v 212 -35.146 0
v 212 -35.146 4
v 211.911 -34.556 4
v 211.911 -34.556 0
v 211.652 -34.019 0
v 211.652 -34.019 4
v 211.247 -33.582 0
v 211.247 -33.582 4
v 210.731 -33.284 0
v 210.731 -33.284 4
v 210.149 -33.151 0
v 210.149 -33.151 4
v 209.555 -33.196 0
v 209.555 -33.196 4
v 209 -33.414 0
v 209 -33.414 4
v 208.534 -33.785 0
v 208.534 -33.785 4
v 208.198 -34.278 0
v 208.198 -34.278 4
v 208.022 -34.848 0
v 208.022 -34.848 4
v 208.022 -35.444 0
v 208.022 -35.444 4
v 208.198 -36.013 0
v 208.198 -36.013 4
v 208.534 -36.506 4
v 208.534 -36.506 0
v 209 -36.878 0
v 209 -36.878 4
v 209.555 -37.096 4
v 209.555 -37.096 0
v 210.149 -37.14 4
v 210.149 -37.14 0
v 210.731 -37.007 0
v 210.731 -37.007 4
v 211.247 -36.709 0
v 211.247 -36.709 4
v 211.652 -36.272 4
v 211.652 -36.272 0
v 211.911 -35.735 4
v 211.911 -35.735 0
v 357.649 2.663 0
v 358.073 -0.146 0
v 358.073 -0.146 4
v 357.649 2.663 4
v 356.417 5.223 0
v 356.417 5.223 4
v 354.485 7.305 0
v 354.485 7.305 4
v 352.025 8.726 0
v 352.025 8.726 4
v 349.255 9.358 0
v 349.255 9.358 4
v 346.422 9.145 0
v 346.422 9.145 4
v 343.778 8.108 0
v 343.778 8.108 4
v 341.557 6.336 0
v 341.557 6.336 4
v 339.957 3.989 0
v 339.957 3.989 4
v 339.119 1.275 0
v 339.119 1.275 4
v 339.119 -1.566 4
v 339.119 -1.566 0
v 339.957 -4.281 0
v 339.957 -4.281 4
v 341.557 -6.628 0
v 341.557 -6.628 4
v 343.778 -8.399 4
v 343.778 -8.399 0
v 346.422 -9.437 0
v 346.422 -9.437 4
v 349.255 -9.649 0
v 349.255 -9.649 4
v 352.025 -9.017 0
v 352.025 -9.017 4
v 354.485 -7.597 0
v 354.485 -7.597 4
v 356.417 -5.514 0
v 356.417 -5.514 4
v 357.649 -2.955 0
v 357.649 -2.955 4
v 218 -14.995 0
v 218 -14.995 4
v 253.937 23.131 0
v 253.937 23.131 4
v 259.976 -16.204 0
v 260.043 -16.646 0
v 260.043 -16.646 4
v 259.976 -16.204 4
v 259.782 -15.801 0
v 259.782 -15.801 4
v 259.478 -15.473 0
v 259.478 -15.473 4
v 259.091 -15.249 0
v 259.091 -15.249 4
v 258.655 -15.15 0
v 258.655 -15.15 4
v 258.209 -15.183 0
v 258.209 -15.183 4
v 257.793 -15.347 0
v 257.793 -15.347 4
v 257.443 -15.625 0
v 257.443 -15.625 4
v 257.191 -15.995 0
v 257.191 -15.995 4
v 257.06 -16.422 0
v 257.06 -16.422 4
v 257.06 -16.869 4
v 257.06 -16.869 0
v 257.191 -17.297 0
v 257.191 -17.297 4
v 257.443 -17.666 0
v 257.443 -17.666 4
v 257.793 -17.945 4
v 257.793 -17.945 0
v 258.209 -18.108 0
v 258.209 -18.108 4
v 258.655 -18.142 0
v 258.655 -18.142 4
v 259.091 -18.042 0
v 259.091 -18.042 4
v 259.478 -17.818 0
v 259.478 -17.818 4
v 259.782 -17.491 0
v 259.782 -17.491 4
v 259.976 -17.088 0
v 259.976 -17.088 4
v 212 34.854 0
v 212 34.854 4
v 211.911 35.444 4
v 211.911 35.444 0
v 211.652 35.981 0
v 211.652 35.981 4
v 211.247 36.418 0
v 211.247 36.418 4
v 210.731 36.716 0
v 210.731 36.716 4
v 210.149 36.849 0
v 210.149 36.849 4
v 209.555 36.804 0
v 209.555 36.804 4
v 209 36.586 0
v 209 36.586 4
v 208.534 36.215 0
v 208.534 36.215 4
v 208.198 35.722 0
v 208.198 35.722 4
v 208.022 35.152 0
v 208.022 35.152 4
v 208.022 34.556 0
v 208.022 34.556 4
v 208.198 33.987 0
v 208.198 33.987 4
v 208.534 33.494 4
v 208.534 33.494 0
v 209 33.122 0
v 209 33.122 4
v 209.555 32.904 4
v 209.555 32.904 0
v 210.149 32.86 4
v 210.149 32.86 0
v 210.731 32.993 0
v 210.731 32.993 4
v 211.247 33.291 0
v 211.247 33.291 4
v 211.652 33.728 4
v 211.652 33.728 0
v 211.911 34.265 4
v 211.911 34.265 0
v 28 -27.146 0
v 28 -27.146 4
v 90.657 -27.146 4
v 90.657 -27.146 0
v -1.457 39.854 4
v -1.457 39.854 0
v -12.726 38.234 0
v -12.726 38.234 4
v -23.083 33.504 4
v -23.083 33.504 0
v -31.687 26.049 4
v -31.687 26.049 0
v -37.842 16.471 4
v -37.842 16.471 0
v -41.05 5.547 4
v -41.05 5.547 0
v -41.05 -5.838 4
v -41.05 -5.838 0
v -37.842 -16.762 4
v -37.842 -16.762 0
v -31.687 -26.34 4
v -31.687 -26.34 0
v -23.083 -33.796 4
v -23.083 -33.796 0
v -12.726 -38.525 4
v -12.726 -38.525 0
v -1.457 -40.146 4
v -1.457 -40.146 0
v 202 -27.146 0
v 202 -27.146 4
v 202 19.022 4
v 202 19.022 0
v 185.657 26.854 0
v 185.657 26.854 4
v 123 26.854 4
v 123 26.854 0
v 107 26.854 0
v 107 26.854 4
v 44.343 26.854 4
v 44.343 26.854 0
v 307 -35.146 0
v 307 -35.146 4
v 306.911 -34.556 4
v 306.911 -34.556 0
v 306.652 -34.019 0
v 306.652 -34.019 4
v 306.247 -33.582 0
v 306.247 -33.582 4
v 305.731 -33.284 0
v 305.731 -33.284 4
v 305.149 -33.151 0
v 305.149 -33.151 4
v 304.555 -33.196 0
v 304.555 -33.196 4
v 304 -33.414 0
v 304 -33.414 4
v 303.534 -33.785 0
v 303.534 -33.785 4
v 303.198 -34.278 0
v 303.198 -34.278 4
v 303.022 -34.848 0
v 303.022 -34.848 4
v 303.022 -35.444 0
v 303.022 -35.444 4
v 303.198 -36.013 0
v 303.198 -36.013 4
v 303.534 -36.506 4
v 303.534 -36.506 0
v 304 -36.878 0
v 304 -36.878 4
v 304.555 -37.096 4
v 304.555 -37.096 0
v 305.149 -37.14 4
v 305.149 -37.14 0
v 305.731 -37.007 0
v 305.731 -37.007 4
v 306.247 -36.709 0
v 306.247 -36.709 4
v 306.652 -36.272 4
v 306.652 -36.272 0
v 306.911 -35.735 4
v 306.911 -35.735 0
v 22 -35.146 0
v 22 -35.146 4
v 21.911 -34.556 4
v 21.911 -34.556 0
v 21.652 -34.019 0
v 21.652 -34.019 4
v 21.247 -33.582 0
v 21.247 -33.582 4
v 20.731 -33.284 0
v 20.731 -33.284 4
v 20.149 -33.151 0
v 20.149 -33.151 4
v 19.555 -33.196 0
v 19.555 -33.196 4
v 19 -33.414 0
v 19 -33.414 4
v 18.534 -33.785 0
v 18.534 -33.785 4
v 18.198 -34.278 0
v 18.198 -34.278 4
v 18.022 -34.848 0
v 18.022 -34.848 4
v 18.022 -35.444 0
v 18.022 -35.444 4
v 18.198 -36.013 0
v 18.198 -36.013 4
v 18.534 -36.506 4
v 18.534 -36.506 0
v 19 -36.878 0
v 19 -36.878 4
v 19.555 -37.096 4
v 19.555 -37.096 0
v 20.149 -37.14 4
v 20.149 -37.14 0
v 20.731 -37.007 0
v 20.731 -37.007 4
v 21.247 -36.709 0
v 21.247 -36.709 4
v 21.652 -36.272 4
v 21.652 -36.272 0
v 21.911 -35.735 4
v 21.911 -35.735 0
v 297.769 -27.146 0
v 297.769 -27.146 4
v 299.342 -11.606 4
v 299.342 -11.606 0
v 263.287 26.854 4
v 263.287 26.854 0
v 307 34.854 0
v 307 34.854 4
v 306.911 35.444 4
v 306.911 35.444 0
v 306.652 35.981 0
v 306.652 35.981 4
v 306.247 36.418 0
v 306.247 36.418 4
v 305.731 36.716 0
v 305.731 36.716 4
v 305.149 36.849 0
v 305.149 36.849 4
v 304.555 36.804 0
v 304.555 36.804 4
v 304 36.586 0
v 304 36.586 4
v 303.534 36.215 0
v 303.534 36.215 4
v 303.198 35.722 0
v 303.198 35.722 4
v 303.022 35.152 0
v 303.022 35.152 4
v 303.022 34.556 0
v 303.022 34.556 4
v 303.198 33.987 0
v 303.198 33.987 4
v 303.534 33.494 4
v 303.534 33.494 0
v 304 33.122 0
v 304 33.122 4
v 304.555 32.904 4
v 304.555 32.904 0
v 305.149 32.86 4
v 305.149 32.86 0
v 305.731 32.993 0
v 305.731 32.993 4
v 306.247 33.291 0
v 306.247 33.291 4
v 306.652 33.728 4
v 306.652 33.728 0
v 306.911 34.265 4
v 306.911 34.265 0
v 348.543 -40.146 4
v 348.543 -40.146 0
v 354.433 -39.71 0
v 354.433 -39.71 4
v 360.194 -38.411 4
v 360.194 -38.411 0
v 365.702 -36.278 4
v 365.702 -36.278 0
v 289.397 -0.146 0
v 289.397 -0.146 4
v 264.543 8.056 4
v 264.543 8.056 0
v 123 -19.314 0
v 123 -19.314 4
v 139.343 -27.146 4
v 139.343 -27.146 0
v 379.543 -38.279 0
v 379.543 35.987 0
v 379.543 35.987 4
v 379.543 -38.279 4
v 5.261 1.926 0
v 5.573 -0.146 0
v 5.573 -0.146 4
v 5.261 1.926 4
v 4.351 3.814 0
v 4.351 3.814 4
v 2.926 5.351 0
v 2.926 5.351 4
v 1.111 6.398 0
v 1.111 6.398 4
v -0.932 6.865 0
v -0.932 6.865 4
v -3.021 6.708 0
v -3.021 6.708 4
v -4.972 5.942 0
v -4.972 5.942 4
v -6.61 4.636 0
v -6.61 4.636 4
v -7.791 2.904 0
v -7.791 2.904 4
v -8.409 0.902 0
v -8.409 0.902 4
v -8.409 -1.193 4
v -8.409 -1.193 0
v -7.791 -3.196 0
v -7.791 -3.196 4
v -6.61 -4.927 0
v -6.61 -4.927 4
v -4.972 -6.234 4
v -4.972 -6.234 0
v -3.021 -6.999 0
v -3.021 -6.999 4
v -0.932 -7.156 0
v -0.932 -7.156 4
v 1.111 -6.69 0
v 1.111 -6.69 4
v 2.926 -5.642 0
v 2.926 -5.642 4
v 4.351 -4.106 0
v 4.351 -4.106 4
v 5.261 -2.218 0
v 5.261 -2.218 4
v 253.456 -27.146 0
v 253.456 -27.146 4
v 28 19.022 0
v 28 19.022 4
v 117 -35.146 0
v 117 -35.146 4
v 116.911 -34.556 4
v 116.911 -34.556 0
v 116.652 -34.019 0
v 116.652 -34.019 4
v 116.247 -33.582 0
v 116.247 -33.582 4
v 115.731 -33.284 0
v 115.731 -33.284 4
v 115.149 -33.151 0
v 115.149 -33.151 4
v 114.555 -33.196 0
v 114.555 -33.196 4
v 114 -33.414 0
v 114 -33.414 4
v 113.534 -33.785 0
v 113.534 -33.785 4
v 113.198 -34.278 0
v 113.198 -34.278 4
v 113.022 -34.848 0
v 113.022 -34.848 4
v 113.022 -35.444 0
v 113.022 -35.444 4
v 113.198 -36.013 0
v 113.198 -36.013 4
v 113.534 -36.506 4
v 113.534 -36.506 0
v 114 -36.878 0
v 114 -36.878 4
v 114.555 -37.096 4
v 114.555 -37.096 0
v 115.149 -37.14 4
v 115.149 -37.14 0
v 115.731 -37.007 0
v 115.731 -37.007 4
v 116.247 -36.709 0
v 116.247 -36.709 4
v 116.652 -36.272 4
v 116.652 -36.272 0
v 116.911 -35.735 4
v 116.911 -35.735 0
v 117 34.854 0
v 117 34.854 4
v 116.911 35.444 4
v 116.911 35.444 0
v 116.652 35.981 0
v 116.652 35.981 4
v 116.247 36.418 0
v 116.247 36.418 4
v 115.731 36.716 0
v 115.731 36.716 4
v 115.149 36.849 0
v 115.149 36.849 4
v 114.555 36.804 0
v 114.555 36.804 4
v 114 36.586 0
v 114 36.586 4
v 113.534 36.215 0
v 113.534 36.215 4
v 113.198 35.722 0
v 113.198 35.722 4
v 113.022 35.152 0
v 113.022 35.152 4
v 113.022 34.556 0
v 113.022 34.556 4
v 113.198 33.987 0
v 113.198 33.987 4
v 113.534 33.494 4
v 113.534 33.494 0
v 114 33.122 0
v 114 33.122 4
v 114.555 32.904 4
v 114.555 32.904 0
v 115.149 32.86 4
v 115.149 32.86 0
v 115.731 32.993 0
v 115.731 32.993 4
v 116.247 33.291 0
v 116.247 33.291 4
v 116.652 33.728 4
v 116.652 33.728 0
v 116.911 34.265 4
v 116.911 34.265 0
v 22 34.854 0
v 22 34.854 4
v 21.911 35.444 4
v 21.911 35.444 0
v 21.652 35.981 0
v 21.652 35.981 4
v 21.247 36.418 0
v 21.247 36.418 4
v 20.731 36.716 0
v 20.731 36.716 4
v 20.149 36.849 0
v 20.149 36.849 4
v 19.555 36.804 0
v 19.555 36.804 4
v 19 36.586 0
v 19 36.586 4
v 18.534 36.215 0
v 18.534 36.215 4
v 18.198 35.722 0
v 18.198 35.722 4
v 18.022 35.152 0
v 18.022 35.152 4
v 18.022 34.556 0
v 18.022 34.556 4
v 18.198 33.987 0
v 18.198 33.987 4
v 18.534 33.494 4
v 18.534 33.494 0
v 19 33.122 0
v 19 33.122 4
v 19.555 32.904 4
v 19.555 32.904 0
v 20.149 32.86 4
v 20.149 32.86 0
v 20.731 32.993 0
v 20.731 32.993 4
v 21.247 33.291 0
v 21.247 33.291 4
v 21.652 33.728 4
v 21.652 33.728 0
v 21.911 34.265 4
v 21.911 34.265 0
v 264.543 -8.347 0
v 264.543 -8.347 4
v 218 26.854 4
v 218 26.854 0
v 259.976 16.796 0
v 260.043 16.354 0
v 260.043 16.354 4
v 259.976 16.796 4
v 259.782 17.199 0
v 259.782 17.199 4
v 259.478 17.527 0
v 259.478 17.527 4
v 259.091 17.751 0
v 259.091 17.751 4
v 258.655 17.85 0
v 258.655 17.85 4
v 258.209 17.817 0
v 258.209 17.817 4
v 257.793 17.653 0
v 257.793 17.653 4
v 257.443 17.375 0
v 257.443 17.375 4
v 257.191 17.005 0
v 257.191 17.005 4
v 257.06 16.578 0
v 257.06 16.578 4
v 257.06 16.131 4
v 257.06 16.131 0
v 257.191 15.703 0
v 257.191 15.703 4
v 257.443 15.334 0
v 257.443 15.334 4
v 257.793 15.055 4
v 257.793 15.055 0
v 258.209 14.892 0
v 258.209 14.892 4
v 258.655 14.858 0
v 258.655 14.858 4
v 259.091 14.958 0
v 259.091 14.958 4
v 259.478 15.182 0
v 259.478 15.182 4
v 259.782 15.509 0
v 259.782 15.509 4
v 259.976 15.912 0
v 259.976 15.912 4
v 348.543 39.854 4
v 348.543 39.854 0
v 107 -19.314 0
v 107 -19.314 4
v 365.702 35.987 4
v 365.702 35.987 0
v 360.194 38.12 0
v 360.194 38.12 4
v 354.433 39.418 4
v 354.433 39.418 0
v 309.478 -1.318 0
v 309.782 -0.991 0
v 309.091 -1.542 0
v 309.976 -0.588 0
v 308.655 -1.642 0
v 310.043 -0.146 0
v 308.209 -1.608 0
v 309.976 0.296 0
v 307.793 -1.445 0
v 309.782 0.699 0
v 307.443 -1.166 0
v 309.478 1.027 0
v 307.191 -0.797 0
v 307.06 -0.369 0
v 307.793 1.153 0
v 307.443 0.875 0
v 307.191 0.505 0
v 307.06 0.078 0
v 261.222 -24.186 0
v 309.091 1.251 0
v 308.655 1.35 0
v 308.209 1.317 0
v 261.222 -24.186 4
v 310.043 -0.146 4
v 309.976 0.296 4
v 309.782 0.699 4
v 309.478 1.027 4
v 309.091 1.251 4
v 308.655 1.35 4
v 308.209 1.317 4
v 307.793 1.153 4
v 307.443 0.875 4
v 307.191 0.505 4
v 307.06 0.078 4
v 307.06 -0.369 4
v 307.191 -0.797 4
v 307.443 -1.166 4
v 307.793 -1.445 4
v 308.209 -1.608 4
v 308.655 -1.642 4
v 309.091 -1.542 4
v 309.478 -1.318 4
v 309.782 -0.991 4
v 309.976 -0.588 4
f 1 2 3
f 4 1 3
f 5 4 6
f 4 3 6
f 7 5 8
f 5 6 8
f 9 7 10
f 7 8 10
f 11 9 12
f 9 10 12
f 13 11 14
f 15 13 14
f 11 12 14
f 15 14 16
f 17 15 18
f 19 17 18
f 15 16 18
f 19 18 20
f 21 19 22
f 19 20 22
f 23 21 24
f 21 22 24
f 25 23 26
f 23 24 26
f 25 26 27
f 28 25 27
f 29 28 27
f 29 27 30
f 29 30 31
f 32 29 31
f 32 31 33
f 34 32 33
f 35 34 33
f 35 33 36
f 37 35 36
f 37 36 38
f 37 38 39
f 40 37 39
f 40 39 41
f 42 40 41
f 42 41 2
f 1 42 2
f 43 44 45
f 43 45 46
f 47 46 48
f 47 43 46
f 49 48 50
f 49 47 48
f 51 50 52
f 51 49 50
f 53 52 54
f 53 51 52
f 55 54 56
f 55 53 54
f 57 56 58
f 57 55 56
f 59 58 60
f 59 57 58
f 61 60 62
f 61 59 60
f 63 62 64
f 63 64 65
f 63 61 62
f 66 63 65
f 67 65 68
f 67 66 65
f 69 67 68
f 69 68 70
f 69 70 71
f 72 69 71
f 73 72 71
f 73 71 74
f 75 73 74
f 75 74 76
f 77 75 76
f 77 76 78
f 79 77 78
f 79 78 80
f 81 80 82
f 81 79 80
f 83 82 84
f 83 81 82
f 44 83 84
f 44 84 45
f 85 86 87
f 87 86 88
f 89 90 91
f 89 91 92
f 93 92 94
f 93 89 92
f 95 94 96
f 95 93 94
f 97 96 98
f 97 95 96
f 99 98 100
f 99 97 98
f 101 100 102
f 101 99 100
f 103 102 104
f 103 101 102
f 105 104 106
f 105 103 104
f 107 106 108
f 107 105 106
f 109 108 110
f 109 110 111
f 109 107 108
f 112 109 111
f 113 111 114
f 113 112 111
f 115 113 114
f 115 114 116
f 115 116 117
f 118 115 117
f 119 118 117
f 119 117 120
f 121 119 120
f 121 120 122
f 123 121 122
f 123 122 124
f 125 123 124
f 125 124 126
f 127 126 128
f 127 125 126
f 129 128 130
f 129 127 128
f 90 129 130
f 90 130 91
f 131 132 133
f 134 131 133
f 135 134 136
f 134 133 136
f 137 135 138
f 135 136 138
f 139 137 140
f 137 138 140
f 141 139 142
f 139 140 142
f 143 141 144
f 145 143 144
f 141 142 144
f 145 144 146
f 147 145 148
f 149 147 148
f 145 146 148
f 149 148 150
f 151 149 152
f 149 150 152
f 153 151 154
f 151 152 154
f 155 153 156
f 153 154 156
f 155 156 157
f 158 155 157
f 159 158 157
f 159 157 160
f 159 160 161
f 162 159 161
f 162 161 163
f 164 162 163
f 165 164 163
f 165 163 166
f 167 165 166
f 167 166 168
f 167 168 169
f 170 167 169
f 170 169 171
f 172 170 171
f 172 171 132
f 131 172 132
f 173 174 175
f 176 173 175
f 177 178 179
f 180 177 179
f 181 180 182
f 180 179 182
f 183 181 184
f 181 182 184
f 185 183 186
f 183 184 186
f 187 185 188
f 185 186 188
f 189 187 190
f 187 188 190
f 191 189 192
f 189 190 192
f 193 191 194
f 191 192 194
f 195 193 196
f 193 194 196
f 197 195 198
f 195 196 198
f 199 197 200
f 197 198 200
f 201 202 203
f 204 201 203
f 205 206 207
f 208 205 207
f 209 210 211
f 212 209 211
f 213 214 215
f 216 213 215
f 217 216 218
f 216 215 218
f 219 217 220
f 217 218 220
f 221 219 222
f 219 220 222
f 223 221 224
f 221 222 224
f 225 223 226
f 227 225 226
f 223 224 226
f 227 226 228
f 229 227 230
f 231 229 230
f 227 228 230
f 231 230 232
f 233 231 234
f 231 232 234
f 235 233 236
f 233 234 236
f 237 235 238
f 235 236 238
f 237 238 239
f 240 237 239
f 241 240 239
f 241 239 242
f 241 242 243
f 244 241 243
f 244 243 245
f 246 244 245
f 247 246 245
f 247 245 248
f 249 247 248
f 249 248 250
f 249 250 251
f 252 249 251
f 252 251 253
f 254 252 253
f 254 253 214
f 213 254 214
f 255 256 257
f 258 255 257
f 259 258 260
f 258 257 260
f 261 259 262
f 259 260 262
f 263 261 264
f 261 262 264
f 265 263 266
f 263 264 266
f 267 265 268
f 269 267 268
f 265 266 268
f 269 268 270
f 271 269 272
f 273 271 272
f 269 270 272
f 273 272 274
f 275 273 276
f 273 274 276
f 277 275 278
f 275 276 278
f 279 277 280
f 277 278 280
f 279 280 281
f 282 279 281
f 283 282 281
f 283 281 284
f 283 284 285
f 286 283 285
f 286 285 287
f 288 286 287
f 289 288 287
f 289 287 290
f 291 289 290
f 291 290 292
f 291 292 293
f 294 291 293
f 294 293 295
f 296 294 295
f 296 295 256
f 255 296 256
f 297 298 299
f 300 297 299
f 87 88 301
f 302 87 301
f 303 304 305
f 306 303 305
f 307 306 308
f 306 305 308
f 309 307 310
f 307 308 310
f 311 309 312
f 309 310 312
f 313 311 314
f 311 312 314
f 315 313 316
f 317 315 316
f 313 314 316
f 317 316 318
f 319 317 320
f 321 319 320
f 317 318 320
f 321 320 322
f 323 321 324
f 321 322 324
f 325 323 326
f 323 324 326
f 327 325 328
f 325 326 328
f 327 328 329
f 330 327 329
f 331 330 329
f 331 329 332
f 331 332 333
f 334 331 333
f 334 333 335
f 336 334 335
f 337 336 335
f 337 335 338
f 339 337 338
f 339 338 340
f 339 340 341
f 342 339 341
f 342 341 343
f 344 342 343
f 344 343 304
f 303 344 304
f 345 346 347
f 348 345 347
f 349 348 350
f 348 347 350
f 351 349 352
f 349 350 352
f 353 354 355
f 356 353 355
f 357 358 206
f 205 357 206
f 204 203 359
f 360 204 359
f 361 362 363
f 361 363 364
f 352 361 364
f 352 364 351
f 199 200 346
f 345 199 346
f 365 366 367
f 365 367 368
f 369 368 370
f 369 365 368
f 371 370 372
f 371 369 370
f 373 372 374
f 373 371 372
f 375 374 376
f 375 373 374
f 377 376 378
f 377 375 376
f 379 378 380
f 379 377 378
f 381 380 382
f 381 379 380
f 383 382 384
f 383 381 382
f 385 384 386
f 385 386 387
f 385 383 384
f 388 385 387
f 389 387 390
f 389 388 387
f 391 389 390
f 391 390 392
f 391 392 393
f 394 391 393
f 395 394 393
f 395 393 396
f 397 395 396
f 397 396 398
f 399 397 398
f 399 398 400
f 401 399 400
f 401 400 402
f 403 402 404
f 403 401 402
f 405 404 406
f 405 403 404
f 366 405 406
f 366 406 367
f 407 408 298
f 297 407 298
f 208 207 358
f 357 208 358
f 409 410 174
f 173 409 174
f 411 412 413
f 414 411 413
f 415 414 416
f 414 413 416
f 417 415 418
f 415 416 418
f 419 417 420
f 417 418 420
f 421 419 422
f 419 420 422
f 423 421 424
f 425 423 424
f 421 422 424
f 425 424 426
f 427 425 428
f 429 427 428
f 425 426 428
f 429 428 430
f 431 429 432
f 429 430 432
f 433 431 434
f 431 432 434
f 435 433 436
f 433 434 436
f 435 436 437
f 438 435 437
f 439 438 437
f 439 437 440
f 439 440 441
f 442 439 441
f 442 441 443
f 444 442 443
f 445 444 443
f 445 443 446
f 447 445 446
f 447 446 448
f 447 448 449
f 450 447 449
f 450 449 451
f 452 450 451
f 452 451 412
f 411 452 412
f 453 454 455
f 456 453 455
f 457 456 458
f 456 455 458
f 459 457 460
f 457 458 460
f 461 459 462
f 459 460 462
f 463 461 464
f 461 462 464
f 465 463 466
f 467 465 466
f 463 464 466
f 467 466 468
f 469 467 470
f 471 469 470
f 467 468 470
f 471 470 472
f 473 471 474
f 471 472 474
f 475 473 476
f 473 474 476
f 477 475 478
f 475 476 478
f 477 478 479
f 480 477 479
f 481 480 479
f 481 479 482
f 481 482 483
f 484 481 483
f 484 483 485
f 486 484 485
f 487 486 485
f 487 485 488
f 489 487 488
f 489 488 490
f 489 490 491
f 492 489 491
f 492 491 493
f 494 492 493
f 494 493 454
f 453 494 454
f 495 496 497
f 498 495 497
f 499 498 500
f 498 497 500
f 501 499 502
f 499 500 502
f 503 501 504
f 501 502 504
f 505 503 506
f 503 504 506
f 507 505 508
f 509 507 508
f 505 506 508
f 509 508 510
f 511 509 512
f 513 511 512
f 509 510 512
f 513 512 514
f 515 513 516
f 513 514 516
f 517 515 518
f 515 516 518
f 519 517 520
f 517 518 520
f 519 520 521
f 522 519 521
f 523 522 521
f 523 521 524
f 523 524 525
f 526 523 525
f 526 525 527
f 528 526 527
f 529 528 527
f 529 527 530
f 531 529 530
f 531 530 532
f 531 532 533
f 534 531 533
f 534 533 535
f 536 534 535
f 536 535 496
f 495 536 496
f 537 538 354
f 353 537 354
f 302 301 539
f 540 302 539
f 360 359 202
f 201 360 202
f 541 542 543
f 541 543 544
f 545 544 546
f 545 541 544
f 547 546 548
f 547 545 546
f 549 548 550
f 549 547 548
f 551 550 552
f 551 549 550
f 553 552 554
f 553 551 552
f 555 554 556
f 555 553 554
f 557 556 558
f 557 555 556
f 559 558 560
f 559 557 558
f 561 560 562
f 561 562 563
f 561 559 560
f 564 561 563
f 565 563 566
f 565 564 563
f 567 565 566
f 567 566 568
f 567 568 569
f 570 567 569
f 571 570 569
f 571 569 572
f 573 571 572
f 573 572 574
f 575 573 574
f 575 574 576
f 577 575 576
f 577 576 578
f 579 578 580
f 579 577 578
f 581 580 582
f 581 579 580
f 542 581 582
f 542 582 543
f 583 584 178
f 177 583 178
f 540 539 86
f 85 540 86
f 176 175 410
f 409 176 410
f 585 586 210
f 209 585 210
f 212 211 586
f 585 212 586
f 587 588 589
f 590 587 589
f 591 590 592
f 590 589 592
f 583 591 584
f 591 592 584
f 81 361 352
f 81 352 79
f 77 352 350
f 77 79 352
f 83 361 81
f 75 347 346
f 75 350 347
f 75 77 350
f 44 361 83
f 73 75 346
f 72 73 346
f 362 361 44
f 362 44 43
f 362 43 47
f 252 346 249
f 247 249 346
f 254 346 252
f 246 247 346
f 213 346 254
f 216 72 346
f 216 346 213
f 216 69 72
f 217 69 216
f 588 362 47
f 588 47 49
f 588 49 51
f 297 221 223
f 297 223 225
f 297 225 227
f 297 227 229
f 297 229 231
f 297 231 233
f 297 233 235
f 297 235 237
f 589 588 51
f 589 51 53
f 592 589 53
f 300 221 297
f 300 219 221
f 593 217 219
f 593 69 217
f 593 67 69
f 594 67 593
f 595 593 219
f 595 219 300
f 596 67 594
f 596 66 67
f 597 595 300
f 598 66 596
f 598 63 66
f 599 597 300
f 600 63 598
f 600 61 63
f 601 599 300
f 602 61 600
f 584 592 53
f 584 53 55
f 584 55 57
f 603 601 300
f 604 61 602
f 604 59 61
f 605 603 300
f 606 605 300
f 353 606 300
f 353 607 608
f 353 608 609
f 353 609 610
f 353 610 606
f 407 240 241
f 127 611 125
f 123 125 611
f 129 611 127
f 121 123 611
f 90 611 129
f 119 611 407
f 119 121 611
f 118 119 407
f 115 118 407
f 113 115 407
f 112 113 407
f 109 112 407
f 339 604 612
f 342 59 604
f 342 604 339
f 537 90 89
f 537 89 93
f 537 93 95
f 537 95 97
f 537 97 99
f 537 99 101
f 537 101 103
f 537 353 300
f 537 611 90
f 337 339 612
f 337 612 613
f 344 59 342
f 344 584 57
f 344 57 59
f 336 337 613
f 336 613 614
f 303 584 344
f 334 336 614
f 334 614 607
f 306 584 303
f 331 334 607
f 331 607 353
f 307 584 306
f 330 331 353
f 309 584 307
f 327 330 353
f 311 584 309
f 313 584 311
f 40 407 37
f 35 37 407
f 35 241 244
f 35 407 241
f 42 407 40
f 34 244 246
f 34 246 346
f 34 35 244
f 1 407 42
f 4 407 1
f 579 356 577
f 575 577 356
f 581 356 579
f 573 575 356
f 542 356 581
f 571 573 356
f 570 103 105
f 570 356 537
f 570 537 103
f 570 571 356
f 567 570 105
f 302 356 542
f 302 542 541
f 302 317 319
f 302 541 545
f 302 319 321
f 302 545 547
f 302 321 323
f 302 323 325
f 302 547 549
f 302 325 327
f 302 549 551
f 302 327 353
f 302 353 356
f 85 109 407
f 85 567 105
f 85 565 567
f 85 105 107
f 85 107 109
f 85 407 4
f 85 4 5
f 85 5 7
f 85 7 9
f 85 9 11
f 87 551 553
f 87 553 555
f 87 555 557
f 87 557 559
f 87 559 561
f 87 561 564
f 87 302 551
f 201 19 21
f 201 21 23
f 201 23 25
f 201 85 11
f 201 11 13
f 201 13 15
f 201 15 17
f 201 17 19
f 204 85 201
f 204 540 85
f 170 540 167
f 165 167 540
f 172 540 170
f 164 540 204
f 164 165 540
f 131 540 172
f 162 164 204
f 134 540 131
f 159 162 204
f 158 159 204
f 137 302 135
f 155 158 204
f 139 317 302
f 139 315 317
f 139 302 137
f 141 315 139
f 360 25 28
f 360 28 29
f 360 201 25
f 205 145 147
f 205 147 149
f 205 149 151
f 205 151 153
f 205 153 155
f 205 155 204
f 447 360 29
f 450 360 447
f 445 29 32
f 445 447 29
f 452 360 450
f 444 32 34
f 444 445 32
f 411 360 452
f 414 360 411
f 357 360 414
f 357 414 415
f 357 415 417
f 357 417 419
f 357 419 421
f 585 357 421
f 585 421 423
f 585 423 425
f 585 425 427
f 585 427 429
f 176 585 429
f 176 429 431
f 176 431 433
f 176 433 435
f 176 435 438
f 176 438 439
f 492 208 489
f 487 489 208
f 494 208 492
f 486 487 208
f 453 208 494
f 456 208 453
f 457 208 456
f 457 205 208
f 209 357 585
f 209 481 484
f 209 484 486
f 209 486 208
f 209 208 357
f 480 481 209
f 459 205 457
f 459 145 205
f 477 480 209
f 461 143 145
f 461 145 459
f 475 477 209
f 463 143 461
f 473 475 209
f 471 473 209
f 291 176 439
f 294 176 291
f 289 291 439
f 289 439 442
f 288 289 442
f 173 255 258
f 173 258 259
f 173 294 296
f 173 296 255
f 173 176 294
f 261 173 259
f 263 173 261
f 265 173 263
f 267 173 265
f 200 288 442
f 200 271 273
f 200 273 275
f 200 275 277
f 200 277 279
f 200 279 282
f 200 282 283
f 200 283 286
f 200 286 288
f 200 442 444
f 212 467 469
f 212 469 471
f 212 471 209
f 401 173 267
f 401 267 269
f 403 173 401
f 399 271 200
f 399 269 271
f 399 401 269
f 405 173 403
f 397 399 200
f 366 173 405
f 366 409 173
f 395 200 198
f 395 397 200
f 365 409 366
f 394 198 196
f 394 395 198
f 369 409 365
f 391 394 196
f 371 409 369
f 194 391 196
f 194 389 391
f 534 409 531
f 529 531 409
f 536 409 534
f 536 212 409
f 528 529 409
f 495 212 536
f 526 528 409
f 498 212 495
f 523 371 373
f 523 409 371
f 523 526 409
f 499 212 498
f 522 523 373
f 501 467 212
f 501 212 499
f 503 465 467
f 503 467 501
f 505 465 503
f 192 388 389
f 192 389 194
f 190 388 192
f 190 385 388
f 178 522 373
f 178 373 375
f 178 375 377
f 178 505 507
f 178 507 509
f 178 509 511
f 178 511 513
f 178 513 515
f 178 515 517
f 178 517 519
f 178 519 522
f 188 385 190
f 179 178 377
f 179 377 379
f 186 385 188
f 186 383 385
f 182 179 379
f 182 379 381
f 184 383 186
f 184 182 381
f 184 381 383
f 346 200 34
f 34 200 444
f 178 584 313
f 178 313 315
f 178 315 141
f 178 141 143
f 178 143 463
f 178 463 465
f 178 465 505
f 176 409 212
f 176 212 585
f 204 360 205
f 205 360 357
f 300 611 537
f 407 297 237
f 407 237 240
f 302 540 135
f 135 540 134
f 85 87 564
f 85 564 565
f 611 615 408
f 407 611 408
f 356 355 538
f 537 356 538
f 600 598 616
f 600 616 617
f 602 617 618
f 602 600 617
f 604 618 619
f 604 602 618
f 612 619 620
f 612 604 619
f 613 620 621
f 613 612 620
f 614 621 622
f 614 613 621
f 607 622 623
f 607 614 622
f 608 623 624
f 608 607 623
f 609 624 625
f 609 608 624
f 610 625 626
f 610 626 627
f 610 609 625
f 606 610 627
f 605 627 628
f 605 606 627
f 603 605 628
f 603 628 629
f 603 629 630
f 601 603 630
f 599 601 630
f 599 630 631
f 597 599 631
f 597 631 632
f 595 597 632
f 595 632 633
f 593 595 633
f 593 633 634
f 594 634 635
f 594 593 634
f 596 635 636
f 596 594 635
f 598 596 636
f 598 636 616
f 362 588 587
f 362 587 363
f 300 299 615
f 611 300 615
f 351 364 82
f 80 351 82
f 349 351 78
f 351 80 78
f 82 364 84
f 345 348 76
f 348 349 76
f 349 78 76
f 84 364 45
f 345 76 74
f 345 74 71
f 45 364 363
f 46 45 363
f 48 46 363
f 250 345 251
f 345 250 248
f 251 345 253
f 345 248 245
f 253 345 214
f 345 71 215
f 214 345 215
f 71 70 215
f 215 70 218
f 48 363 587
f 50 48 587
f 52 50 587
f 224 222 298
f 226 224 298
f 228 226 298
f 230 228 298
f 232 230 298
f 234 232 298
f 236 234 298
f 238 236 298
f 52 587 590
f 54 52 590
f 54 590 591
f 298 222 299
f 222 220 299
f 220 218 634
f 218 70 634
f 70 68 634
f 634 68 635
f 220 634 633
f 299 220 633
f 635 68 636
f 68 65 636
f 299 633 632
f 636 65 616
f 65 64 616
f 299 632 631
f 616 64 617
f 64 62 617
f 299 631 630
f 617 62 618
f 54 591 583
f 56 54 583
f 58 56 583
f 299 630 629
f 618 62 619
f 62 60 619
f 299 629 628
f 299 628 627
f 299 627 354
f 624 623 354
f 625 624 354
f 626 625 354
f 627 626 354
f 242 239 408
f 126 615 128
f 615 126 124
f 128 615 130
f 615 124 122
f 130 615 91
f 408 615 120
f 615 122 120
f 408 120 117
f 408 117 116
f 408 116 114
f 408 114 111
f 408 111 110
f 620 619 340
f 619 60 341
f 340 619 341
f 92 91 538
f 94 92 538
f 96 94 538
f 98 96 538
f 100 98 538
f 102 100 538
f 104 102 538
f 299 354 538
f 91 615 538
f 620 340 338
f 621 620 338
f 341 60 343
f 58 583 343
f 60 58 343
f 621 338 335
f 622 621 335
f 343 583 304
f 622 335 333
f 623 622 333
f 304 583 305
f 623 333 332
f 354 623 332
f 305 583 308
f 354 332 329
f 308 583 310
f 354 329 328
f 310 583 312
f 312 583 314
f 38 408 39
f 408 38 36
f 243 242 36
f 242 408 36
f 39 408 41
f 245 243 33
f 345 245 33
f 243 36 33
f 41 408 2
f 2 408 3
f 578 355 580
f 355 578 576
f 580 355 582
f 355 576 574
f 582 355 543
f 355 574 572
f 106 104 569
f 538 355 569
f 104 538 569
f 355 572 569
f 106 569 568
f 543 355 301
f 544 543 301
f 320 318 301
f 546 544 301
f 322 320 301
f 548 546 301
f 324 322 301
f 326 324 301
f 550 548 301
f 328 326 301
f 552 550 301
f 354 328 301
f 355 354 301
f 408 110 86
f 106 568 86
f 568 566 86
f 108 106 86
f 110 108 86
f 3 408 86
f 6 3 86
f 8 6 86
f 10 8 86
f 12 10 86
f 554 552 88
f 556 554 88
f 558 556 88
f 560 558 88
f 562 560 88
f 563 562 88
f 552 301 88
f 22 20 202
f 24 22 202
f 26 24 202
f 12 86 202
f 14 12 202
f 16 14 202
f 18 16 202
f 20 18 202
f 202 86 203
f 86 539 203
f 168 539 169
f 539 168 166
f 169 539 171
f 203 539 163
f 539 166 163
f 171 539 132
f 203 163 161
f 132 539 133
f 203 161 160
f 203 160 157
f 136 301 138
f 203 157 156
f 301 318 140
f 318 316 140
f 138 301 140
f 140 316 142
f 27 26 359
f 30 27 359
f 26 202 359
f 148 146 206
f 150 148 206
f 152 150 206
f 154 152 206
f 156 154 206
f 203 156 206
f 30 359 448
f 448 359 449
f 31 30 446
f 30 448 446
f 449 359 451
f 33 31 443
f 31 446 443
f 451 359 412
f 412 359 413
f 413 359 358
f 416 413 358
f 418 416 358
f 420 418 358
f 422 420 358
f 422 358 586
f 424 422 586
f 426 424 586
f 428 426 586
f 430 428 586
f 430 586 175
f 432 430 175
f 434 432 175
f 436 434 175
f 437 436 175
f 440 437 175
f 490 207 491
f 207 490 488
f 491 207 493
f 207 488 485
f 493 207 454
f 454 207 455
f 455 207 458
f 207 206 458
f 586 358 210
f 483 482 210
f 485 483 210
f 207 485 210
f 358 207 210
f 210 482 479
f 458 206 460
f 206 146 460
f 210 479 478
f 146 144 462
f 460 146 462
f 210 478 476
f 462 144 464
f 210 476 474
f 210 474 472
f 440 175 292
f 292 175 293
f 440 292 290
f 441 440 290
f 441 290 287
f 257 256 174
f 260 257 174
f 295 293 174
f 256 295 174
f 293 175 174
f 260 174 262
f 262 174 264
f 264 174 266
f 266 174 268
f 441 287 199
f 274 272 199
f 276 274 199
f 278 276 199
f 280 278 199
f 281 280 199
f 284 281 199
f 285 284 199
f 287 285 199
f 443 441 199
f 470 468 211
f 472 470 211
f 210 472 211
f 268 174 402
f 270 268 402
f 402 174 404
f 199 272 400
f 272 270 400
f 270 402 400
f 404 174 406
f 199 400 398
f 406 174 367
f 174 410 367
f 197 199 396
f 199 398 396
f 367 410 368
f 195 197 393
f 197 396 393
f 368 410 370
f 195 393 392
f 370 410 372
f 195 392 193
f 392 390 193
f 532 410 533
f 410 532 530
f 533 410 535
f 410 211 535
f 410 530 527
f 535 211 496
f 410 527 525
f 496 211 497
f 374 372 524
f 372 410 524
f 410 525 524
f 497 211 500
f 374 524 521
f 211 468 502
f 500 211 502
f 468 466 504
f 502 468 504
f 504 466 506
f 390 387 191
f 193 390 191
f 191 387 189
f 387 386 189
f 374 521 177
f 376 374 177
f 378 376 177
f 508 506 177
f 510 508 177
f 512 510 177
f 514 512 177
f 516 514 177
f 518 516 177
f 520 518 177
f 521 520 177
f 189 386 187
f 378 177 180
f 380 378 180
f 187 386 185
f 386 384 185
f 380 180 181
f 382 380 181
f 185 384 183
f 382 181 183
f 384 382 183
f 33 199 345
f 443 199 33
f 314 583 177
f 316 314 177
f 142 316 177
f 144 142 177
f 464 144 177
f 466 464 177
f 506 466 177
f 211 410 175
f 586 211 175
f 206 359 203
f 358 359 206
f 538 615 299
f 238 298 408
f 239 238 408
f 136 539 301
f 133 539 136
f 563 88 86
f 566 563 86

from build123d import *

# Parameters (mm, degrees)
SKETCH_1_R          = 7.03
SKETCH_1_R_2        = 1.5
SKETCH_1_R_3        = 9.53
EXTRUDE_1_DEPTH     = 4
SKETCH_2_R          = 2
CUT_EXTRUDE_1_DEPTH = 10
CUT_EXTRUDE_4_DEPTH = 4
EXTRUDE_2_DEPTH     = 4


with BuildPart() as part:
    # 草图1 → 凸台-拉伸1 (new body)
    with BuildSketch(Plane.XY):
        with BuildLine():
            ThreePointArc((348.542857143, -40.145714286), (388.542857143, -0.145714286), (348.542857143, 39.854285714))
            Line((348.542857143, 39.854285714), (-1.457142857, 39.854285714))
            ThreePointArc((-1.457142857, 39.854285714), (-41.457142857, -0.145714286), (-1.457142857, -40.145714286))
            Line((-1.457142857, -40.145714286), (348.542857143, -40.145714286))
        make_face()
        with Locations((-1.457142857, -0.145714286)):
            Circle(SKETCH_1_R, mode=Mode.SUBTRACT)
        with Locations((258.542857143, -16.645714286)):
            Circle(SKETCH_1_R_2, mode=Mode.SUBTRACT)
        with Locations((258.542857143, 16.354285714)):
            Circle(SKETCH_1_R_2, mode=Mode.SUBTRACT)
        with Locations((308.542857143, -0.145714286)):
            Circle(SKETCH_1_R_2, mode=Mode.SUBTRACT)
        with Locations((348.542857143, -0.145714286)):
            Circle(SKETCH_1_R_3, mode=Mode.SUBTRACT)
    extrude(amount=EXTRUDE_1_DEPTH)

    # 草图2 → 切除-拉伸1 (cut)
    with BuildSketch(Plane.XY.offset(4)):
        Polygon((107, 26.854285714), (44.343341396, 26.854285714), (107, -19.31377852), align=None)
        Polygon((90.656658604, -27.145714286), (28, 19.022349949), (28, -27.145714286), align=None)
        with Locations((210, 34.854285714)):
            Circle(SKETCH_2_R)
        with Locations((115, -35.145714286)):
            Circle(SKETCH_2_R)
        Polygon((202, 19.022349949), (139.343341396, -27.145714286), (202, -27.145714286), align=None)
        Polygon((185.656658604, 26.854285714), (123, 26.854285714), (123, -19.31377852), align=None)
        Polygon((263.286571323, 26.854285714), (218, 26.854285714), (218, -14.994963043), (253.936816603, 23.131059281), align=None)
        Polygon((297.768914783, -27.145714286), (299.341875576, -11.606383875), (261.222229771, -24.18586699), (253.455773316, -27.145714286), align=None)
        Polygon((264.542857143, -8.347455032), (289.396616979, -0.145714286), (264.542857143, 8.05602646), align=None)
        with Locations((20, 34.854285714)):
            Circle(SKETCH_2_R)
        with Locations((115, 34.854285714)):
            Circle(SKETCH_2_R)
        with Locations((305, 34.854285714)):
            Circle(SKETCH_2_R)
        with Locations((305, -35.145714286)):
            Circle(SKETCH_2_R)
        with Locations((210, -35.145714286)):
            Circle(SKETCH_2_R)
        with Locations((20, -35.145714286)):
            Circle(SKETCH_2_R)
    extrude(amount=-CUT_EXTRUDE_1_DEPTH, mode=Mode.SUBTRACT)

    # 草图3 → 切除-拉伸4 (cut)
    with BuildSketch(Plane(origin=(0, 0, 0), x_dir=(-1, 0, 0), z_dir=(0, 0, -1))):
        Polygon((-379.542857143, -0.145714286), (-379.542857143, 86.711362621), (-469.13936256, 65.161980464), (-431.797169727, -71.622846313), (-379.542857143, -46.898899995), align=None)
    extrude(amount=-CUT_EXTRUDE_4_DEPTH, mode=Mode.SUBTRACT)

    # 草图4 → 凸台-拉伸2 (add)
    with BuildSketch(Plane(origin=(0, 0, 0), x_dir=(-1, 0, 0), z_dir=(0, 0, -1))):
        Polygon((-379.542857143, -25.424163605), (-379.542857143, -38.278889608), (-365.701849351, -36.278372455), (-365.701849351, 35.986943884), (-379.542857143, 35.986943884), (-379.542857143, 25.132735034), align=None)
    extrude(amount=-EXTRUDE_2_DEPTH)


solid = part.part
